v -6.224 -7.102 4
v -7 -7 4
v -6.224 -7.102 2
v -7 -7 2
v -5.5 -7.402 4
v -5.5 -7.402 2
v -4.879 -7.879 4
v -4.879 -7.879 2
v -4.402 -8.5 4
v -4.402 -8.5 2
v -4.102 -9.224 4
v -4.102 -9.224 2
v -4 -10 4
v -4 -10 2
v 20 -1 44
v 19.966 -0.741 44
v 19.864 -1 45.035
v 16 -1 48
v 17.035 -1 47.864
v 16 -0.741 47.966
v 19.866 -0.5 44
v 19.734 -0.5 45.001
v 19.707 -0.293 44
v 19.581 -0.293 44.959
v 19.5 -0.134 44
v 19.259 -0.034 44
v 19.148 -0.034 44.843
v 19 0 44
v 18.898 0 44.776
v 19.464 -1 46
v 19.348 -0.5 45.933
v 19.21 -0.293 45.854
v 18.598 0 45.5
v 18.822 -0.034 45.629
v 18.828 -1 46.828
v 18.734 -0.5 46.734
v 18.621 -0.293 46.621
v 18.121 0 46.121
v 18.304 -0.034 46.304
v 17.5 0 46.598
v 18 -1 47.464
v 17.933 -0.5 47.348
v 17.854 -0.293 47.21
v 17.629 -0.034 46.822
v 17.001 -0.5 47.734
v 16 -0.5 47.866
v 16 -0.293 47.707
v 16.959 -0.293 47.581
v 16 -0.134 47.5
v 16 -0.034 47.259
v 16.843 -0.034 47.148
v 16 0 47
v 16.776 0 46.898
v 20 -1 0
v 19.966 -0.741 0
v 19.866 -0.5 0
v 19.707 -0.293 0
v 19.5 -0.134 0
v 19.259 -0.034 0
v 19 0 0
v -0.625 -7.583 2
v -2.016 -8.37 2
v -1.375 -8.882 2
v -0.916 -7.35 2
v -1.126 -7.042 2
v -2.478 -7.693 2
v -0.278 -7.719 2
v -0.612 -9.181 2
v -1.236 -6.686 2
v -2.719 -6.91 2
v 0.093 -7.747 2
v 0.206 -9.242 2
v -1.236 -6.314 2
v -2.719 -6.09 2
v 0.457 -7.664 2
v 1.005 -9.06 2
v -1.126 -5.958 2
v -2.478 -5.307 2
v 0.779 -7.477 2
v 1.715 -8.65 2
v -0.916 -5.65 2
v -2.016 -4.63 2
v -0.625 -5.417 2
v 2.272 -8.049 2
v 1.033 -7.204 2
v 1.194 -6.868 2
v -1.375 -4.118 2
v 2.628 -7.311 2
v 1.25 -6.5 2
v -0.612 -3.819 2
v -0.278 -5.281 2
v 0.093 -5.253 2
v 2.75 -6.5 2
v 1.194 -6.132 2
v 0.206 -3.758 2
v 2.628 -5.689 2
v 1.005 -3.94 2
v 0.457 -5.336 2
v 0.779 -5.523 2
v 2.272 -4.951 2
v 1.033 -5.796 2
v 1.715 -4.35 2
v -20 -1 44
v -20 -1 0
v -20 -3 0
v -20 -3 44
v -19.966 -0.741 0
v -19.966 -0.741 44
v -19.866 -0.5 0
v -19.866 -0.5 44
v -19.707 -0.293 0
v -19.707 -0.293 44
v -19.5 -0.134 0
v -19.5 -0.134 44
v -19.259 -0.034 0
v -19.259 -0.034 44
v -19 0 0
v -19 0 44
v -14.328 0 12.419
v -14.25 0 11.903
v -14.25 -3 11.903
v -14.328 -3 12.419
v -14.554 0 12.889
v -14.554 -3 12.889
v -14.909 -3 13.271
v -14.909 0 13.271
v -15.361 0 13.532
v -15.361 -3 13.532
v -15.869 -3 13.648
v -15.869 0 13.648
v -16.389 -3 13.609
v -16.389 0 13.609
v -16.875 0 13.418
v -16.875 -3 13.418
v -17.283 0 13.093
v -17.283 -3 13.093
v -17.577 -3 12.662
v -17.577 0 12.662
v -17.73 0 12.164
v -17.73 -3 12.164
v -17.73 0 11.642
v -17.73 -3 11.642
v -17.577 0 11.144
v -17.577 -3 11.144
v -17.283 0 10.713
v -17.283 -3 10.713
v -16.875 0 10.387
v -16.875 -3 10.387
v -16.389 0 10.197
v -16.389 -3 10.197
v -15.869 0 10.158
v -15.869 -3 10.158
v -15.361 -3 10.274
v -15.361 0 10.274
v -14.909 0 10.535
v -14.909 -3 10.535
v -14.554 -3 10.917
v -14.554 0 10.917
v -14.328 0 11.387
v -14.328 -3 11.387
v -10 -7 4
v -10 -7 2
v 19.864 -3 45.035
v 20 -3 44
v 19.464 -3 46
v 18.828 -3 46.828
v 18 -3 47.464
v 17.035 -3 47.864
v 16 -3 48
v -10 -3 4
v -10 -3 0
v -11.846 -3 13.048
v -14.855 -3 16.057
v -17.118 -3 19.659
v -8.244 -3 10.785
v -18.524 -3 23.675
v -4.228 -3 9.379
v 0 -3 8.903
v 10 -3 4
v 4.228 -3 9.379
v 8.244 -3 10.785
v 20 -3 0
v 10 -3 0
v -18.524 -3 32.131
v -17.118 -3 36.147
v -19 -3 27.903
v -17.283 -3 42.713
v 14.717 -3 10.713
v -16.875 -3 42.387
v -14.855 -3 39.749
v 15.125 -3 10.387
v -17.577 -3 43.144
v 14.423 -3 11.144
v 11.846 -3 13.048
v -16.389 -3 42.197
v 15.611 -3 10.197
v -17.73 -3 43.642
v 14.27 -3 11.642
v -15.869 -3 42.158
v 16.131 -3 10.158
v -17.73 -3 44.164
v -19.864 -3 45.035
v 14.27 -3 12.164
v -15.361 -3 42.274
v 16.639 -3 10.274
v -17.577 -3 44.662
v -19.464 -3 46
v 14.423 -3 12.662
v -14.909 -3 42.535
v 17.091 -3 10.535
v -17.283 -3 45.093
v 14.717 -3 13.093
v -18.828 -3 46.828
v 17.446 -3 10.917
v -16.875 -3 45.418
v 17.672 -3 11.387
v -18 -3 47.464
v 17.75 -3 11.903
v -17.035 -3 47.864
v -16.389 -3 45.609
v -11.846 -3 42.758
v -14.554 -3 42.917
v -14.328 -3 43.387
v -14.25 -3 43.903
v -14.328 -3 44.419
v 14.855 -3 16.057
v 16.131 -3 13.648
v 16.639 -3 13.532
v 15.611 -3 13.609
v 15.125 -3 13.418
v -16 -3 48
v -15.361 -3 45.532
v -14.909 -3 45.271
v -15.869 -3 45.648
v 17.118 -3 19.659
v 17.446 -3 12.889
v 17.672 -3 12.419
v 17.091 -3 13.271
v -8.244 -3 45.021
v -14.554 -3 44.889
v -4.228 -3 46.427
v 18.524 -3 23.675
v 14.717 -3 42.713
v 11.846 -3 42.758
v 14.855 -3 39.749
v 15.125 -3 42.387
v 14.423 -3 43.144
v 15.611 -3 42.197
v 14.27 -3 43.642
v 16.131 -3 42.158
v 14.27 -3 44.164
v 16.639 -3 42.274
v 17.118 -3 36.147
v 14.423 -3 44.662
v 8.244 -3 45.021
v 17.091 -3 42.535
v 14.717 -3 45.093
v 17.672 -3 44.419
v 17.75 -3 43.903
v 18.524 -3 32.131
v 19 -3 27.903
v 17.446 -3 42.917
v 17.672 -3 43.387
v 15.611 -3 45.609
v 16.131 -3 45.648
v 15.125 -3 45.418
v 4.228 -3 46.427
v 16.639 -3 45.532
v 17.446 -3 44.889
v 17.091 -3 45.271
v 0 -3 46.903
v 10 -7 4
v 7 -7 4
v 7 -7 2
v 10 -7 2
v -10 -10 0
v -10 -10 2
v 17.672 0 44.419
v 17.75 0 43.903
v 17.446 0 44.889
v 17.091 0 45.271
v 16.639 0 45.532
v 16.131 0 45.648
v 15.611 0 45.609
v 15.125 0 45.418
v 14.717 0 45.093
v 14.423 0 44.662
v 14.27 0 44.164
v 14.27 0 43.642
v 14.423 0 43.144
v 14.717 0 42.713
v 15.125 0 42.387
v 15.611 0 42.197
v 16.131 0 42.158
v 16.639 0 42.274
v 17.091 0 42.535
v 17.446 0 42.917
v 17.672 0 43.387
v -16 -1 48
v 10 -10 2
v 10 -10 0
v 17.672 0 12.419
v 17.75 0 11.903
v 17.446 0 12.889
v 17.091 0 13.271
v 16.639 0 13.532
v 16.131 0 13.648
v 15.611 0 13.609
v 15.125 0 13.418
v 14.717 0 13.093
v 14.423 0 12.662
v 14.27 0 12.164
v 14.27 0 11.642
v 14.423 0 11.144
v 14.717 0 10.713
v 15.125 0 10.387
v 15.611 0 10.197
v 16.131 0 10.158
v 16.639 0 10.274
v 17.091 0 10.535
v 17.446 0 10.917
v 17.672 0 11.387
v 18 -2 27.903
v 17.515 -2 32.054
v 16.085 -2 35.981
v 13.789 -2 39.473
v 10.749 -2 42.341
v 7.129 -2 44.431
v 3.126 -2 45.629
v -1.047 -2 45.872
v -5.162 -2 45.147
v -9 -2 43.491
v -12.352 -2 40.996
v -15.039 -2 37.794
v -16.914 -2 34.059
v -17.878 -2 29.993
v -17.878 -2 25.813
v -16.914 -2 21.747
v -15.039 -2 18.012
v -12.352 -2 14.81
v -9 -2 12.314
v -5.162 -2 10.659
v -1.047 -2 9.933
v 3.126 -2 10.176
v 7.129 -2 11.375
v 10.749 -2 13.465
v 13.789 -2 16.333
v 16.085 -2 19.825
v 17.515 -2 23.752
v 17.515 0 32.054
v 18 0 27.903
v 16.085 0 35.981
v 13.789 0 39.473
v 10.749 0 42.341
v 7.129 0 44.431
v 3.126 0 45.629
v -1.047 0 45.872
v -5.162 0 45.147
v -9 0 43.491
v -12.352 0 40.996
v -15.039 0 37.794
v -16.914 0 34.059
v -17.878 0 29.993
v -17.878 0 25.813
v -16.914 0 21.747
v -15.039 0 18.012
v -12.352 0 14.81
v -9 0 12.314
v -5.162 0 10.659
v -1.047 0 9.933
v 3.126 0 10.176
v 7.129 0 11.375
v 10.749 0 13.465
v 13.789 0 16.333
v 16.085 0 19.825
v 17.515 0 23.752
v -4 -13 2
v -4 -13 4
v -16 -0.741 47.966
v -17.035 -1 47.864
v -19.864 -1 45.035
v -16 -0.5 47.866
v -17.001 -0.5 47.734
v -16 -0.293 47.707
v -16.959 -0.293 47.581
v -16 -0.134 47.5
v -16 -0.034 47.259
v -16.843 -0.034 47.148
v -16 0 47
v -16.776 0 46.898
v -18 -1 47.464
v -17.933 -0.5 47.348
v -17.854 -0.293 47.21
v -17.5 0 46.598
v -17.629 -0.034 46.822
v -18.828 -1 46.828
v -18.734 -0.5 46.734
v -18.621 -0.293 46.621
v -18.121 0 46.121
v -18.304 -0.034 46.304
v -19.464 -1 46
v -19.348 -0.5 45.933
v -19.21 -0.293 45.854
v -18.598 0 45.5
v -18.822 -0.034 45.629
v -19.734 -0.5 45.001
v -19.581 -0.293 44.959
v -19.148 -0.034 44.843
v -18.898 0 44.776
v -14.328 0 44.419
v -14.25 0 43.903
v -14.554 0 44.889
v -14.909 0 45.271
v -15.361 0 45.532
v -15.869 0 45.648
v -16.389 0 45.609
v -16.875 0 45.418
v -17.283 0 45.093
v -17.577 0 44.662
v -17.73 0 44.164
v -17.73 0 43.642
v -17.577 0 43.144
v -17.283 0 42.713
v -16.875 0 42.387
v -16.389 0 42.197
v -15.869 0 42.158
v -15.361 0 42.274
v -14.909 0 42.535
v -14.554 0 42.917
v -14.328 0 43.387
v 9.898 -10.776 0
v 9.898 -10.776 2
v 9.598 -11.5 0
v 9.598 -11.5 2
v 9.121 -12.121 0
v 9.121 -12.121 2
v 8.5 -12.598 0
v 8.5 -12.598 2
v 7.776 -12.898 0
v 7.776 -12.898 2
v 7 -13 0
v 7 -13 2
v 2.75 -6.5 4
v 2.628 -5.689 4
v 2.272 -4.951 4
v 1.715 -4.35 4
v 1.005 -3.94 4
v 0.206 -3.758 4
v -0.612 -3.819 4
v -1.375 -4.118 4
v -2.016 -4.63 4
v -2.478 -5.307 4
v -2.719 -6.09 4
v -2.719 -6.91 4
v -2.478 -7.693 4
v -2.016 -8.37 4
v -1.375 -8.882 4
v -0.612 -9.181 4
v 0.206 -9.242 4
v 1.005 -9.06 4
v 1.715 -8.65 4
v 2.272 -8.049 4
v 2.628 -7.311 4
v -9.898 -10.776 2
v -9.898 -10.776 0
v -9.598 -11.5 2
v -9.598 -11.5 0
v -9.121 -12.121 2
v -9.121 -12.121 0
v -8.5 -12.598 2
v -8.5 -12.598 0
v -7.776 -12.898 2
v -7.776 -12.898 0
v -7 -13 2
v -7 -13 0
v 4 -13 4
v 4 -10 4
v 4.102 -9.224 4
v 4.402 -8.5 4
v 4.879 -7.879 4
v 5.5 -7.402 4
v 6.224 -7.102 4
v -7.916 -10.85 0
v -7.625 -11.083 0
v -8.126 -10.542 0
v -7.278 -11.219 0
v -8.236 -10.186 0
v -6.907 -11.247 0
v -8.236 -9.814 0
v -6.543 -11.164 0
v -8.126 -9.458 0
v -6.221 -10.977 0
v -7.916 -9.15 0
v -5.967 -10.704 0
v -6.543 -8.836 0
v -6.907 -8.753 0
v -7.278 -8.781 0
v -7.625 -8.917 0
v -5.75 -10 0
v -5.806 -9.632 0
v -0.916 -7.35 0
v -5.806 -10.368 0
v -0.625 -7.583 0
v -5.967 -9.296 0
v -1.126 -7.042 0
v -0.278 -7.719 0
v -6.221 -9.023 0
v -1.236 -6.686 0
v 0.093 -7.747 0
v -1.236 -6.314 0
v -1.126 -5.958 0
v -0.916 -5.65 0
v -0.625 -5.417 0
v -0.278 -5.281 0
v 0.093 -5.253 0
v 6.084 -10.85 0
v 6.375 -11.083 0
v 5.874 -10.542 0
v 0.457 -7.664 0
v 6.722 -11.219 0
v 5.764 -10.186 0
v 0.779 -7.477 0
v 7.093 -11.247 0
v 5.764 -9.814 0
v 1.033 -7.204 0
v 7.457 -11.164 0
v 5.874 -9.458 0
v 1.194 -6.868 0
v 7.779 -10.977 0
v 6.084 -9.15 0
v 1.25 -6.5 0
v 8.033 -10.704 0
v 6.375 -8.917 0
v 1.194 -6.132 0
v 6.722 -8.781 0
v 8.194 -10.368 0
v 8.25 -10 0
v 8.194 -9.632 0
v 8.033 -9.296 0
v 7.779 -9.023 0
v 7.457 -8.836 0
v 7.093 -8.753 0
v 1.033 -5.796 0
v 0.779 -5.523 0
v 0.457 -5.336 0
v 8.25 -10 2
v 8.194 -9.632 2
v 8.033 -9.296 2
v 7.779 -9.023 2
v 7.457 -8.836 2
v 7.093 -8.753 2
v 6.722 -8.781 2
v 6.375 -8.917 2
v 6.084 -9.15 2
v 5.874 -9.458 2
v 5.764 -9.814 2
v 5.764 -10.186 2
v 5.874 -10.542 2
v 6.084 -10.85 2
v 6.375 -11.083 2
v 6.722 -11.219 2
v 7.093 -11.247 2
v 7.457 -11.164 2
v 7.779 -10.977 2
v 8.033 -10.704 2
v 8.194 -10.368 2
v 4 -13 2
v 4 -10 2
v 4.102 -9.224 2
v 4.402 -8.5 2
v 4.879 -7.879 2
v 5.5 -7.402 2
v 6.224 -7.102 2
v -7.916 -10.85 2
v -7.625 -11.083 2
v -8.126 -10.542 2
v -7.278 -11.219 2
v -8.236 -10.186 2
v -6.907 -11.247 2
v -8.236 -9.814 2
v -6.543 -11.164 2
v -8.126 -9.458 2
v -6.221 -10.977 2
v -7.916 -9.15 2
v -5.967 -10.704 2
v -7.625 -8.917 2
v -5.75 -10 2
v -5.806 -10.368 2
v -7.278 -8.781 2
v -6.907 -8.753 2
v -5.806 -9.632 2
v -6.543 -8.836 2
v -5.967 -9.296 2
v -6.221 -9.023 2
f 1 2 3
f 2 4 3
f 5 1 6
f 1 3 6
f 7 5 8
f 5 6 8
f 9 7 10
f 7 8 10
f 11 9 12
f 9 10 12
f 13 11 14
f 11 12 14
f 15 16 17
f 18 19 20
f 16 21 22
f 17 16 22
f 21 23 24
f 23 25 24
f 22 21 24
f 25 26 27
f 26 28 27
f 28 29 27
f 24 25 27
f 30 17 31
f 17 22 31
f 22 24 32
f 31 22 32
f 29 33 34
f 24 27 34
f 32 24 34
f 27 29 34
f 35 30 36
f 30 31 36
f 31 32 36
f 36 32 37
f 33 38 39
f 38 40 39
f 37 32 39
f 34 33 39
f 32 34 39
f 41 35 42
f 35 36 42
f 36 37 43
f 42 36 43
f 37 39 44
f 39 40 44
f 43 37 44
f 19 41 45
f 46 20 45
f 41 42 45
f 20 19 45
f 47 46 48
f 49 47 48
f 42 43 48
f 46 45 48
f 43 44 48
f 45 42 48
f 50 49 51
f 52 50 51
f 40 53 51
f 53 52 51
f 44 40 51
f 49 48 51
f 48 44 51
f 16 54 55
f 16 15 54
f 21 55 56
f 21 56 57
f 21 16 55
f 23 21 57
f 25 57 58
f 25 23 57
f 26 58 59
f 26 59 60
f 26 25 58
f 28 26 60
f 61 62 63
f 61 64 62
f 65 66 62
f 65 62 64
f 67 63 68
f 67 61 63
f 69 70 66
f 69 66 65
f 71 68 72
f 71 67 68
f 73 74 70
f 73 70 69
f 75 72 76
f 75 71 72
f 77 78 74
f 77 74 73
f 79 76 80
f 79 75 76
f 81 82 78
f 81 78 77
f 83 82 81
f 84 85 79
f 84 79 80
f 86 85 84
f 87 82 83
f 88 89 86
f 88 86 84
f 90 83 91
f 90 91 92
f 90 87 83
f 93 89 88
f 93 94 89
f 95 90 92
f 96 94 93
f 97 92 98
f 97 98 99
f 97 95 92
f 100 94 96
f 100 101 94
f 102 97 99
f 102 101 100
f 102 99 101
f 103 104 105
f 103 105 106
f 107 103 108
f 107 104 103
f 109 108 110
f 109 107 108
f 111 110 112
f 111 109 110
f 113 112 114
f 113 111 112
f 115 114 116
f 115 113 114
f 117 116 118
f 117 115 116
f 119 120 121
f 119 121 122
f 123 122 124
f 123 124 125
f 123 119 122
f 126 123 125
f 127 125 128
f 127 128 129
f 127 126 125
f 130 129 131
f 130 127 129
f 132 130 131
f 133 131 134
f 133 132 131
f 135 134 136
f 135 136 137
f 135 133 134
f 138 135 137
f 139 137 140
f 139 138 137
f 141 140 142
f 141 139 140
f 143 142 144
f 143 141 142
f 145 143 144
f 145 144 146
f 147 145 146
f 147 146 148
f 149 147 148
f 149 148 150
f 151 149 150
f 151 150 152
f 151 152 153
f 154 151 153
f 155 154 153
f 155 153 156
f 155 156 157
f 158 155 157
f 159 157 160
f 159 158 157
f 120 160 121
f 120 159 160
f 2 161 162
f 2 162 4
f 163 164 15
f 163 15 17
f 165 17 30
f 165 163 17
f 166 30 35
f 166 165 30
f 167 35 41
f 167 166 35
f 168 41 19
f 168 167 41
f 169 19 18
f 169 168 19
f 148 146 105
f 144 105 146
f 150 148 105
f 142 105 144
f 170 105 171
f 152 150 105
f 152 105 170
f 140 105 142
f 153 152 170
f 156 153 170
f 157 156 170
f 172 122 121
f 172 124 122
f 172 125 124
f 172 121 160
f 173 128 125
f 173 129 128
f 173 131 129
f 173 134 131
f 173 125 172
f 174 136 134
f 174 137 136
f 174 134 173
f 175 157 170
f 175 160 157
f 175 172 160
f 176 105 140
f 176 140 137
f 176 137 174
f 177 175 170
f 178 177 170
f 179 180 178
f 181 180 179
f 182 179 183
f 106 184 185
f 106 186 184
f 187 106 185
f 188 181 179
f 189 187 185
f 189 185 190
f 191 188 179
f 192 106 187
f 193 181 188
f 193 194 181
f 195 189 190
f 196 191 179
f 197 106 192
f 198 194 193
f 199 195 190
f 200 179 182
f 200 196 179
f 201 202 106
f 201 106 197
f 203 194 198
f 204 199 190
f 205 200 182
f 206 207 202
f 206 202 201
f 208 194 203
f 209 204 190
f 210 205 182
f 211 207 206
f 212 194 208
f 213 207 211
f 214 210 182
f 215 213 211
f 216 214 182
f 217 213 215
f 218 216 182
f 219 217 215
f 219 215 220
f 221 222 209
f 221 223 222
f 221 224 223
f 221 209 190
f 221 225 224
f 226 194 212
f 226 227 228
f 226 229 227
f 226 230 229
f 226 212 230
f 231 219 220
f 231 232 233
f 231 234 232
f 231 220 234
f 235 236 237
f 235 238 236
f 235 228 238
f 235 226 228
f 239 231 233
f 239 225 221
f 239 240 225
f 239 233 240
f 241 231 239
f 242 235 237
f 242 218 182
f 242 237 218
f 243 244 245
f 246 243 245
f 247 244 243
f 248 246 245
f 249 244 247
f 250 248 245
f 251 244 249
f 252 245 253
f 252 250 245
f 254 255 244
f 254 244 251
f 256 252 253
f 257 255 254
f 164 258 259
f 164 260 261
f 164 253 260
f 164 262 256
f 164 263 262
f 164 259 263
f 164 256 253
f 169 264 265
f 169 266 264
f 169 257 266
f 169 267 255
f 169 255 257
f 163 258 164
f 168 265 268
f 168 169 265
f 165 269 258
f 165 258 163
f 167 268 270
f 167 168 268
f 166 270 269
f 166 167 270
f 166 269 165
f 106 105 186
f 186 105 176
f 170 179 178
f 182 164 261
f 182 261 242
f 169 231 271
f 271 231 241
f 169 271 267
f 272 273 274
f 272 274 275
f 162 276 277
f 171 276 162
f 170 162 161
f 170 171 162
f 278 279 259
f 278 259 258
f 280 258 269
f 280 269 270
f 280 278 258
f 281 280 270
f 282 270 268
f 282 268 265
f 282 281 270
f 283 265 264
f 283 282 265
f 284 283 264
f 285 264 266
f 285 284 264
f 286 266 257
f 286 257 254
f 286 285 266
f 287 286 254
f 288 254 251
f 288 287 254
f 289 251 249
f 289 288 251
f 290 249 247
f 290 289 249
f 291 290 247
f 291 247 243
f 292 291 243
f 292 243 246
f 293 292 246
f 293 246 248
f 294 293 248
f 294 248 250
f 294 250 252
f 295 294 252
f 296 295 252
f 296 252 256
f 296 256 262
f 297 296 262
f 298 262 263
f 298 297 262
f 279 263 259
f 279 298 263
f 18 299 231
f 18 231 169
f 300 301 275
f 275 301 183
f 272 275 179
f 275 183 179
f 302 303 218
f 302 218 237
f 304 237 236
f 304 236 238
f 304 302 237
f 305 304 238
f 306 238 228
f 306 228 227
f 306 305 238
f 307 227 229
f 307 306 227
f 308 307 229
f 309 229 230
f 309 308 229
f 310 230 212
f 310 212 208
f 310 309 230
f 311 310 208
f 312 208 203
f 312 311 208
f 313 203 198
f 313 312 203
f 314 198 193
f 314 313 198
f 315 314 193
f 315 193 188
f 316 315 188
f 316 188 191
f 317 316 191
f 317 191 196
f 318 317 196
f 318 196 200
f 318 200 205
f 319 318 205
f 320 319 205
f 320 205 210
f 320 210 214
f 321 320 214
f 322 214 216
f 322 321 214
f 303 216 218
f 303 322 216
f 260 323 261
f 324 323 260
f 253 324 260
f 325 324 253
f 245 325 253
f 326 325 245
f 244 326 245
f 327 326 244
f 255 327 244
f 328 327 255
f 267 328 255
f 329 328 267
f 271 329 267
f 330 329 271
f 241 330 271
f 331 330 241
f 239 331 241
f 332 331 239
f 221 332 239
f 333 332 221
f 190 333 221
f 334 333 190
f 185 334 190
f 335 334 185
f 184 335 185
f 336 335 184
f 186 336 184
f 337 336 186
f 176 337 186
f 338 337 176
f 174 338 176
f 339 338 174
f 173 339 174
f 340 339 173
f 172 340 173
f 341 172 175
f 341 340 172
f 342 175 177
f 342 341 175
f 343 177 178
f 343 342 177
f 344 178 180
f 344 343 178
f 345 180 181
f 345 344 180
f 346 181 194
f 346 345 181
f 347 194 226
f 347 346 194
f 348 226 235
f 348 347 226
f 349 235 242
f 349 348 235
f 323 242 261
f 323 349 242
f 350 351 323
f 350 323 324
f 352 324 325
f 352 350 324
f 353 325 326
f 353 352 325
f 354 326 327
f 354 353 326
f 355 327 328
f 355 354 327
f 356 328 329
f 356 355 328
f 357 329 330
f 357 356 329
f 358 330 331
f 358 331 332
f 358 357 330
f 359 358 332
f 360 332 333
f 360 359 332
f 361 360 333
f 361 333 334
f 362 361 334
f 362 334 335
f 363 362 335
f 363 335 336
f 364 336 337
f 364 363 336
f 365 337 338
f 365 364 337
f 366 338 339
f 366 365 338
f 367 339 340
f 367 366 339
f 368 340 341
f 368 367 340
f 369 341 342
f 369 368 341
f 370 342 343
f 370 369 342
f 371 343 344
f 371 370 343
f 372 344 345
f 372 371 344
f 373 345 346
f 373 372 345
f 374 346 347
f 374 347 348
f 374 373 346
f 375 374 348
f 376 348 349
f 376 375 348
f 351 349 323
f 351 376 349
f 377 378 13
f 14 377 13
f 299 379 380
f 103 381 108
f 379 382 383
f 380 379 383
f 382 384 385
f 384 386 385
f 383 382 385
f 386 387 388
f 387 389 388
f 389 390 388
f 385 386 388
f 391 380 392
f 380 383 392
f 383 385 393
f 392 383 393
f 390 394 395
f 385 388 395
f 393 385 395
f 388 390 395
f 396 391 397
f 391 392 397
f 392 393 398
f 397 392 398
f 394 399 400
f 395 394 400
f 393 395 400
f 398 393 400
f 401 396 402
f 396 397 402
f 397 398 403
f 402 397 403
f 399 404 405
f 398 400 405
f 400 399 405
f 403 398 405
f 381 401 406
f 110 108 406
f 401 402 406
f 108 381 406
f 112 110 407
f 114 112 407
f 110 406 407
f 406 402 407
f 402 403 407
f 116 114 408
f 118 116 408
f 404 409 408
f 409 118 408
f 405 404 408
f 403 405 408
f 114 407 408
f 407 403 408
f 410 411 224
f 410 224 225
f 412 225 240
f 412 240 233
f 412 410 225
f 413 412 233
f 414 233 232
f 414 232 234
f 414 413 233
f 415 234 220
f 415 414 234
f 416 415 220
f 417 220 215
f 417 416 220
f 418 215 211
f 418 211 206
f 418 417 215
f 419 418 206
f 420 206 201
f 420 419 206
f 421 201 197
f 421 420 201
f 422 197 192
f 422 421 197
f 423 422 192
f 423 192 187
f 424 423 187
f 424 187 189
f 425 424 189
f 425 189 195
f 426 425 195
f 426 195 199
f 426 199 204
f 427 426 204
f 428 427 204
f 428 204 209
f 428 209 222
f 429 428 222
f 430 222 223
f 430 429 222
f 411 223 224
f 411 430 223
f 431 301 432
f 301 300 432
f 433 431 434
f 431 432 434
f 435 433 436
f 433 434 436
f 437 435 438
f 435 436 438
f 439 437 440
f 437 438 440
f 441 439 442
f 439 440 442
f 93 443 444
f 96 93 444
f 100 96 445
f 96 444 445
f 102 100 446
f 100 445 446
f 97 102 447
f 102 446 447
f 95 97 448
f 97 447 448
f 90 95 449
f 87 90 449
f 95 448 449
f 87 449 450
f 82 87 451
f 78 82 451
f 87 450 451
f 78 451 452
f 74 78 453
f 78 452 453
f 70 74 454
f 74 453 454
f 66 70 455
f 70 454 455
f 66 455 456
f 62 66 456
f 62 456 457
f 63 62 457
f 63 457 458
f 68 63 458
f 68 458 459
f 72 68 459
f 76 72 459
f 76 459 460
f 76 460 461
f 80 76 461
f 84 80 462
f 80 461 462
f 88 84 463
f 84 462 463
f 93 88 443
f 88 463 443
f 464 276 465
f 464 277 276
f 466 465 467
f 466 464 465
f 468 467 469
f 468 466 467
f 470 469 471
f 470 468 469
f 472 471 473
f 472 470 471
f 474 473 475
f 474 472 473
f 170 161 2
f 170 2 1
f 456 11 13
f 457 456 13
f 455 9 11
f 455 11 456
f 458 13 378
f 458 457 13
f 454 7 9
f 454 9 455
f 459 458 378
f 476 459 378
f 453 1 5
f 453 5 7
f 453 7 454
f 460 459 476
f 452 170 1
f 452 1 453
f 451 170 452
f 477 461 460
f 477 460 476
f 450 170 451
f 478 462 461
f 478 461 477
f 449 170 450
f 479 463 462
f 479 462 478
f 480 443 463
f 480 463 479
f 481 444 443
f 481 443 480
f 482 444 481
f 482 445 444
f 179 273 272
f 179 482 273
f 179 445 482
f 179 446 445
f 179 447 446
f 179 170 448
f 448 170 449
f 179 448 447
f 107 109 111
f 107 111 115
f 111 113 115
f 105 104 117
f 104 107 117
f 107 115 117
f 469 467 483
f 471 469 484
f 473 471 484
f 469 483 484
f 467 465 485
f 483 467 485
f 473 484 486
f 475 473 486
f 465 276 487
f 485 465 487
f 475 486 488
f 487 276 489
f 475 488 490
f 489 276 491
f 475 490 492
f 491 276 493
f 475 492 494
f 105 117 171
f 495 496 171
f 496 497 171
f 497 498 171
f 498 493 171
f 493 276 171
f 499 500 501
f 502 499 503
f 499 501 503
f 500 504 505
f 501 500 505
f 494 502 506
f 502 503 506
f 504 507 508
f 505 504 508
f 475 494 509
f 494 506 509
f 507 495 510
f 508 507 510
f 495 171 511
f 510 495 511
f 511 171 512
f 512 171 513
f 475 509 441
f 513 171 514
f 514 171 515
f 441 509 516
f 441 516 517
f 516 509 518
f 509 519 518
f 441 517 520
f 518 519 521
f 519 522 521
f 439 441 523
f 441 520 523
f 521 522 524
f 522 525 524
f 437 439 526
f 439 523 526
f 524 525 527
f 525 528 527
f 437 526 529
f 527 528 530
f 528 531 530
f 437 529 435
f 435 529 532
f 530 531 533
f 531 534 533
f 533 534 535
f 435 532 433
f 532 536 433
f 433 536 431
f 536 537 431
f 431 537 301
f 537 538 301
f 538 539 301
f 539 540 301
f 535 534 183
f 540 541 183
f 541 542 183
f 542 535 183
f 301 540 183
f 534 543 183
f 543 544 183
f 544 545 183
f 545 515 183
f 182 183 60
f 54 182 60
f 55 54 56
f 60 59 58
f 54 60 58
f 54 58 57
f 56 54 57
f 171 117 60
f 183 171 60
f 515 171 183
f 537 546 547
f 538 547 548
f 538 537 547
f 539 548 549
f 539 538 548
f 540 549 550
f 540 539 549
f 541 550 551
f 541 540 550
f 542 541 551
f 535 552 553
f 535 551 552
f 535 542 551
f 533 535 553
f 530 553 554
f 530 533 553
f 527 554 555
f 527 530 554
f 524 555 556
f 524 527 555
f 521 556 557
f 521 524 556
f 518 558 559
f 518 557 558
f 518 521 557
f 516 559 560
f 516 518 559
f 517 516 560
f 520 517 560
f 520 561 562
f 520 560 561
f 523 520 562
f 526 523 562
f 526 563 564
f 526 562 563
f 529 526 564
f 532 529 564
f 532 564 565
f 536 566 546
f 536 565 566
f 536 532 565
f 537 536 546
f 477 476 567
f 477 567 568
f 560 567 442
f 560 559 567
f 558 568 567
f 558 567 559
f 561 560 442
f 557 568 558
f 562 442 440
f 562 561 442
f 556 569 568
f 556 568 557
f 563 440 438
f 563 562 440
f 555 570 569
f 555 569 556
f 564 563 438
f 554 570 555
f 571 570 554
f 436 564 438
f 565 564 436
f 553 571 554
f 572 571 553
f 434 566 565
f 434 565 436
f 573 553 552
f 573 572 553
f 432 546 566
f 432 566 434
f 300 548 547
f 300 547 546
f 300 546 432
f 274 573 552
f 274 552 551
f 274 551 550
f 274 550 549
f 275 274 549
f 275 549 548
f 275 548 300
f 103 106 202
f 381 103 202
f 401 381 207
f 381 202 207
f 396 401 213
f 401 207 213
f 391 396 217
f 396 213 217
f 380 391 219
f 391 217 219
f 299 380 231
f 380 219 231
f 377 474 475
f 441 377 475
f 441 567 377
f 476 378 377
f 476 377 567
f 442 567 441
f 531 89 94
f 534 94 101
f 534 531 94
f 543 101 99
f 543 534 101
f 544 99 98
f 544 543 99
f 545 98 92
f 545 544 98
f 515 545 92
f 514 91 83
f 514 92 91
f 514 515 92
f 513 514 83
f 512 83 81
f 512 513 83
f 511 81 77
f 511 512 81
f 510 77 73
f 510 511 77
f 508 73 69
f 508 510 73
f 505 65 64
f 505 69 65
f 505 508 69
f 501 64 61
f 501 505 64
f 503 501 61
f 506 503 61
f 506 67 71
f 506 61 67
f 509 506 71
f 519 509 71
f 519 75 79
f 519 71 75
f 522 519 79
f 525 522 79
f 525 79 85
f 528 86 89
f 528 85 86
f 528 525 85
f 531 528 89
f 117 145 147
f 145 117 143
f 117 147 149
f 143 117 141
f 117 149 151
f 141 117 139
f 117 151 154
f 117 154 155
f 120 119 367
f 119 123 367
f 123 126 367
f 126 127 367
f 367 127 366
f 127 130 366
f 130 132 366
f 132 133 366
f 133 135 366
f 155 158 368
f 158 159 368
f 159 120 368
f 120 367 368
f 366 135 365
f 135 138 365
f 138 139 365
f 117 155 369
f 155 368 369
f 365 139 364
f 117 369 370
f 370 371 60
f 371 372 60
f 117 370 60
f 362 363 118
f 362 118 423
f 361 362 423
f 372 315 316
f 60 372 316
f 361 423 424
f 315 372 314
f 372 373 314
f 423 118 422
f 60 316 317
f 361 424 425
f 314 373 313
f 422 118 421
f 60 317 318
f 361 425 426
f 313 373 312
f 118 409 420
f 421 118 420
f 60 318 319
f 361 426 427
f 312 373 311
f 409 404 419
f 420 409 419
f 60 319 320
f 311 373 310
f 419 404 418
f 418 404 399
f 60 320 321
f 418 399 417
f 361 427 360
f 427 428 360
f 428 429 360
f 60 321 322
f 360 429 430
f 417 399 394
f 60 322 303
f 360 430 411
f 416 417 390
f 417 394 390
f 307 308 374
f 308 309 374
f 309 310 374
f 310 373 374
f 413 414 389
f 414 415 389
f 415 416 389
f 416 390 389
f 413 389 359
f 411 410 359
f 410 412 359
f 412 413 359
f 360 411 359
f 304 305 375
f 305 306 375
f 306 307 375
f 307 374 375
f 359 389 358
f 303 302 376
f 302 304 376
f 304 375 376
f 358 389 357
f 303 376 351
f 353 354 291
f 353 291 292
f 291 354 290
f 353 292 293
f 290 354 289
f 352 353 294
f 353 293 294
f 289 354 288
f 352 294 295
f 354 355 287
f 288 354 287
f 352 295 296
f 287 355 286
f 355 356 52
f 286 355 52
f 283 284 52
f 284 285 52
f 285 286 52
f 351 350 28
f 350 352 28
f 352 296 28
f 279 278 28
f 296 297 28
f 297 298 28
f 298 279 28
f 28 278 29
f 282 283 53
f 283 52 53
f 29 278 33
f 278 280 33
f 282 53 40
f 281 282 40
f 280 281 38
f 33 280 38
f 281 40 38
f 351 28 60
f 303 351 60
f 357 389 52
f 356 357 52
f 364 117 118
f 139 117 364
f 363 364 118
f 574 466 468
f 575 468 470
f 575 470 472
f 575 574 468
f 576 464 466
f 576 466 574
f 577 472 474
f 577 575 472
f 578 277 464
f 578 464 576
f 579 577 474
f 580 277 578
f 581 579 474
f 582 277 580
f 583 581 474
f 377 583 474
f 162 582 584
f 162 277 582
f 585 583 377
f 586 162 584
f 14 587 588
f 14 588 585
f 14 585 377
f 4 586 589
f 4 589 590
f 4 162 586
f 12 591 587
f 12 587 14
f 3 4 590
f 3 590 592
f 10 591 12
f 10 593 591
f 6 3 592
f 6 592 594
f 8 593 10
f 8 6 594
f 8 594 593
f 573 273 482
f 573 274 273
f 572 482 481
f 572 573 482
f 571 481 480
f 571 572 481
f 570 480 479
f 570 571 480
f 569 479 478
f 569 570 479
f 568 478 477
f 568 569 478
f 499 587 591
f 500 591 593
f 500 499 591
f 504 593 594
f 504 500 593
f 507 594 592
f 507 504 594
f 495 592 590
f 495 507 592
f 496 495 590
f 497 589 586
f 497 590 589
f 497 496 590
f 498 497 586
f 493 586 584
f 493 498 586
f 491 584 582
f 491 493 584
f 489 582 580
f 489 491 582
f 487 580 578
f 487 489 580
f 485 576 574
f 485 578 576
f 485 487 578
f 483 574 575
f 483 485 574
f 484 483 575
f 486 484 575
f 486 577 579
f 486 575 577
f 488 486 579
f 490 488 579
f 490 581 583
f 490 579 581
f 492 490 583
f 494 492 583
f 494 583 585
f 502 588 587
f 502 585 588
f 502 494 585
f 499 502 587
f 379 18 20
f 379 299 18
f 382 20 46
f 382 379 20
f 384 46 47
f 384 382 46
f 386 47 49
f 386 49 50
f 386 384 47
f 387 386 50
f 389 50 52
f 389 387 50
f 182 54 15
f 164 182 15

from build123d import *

# Parameters (mm, degrees)
F0_W     = 40
F0_H     = 48
F0_R     = 1.75
F0_R_2   = 18
F1_DEPTH = 3
F2_W     = 20
F2_H     = 4
F3_DEPTH = 13
F4_R     = 1.25
F5_DEPTH = 25
F6_W     = 6
F6_H     = 6
F6_R     = 2.75
F7_DEPTH = 2
F8_R     = 4
F9_R     = 3
F10_SIZE = 1
F11_R    = 1


with BuildPart() as f1:
    # F0 (on Front) → F1 (new body)
    with BuildSketch(Plane.XZ):
        with Locations((0, 24)):
            Rectangle(F0_W, F0_H)
        with Locations((-16, 11.902926147)):
            Circle(F0_R, mode=Mode.SUBTRACT)
        with Locations((16, 11.902926147)):
            Circle(F0_R, mode=Mode.SUBTRACT)
        with Locations((-16, 43.902926147)):
            Circle(F0_R, mode=Mode.SUBTRACT)
        with Locations((0, 27.902926147)):
            Circle(F0_R_2, mode=Mode.SUBTRACT)
        with Locations((16, 43.902926147)):
            Circle(F0_R, mode=Mode.SUBTRACT)
    extrude(amount=F1_DEPTH)

    # F2 (on Front) → F3 (join)
    with BuildSketch(Plane.XZ):
        with Locations((0, 2)):
            Rectangle(F2_W, F2_H)
    extrude(amount=F3_DEPTH)

    # F4 (on Top) → F5 (cut)
    with BuildSketch(Plane.XY):
        with Locations((0, -6.5)):
            Circle(F4_R)
        with Locations((-7, -10)):
            Circle(F4_R)
        with Locations((7, -10)):
            Circle(F4_R)
    extrude(amount=F5_DEPTH, mode=Mode.SUBTRACT)

    # F6 (on face) → F7 (cut)
    with BuildSketch(Plane.XY.offset(4)):
        with Locations((-7, -10)):
            Rectangle(F6_W, F6_H)
        with Locations((7, -10)):
            Rectangle(F6_W, F6_H)
        with Locations((0, -6.5)):
            Circle(F6_R)
    extrude(amount=-F7_DEPTH, mode=Mode.SUBTRACT)

    # F8
    f8_edges = [f1.edges().sort_by_distance(p)[0] for p in [
        (20, -1.5, 48),
        (-20, -1.5, 48),
    ]]
    fillet(f8_edges, radius=F8_R)

    # F9
    f9_edges = [f1.edges().sort_by_distance(p)[0] for p in [
        (4, -7, 3),
        (10, -13, 1),
        (-4, -7, 3),
        (-10, -13, 1),
    ]]
    fillet(f9_edges, radius=F9_R)

    # F10
    f10_edges = [f1.edges().sort_by_distance(p)[0] for p in [
        (-18, -3, 27.902926),
    ]]
    chamfer(f10_edges, length=F10_SIZE)

    # F11
    f11_edges = [f1.edges().sort_by_distance(p)[0] for p in [
        (20, 0, 22),
    ]]
    fillet(f11_edges, radius=F11_R)


solid = f1.part
